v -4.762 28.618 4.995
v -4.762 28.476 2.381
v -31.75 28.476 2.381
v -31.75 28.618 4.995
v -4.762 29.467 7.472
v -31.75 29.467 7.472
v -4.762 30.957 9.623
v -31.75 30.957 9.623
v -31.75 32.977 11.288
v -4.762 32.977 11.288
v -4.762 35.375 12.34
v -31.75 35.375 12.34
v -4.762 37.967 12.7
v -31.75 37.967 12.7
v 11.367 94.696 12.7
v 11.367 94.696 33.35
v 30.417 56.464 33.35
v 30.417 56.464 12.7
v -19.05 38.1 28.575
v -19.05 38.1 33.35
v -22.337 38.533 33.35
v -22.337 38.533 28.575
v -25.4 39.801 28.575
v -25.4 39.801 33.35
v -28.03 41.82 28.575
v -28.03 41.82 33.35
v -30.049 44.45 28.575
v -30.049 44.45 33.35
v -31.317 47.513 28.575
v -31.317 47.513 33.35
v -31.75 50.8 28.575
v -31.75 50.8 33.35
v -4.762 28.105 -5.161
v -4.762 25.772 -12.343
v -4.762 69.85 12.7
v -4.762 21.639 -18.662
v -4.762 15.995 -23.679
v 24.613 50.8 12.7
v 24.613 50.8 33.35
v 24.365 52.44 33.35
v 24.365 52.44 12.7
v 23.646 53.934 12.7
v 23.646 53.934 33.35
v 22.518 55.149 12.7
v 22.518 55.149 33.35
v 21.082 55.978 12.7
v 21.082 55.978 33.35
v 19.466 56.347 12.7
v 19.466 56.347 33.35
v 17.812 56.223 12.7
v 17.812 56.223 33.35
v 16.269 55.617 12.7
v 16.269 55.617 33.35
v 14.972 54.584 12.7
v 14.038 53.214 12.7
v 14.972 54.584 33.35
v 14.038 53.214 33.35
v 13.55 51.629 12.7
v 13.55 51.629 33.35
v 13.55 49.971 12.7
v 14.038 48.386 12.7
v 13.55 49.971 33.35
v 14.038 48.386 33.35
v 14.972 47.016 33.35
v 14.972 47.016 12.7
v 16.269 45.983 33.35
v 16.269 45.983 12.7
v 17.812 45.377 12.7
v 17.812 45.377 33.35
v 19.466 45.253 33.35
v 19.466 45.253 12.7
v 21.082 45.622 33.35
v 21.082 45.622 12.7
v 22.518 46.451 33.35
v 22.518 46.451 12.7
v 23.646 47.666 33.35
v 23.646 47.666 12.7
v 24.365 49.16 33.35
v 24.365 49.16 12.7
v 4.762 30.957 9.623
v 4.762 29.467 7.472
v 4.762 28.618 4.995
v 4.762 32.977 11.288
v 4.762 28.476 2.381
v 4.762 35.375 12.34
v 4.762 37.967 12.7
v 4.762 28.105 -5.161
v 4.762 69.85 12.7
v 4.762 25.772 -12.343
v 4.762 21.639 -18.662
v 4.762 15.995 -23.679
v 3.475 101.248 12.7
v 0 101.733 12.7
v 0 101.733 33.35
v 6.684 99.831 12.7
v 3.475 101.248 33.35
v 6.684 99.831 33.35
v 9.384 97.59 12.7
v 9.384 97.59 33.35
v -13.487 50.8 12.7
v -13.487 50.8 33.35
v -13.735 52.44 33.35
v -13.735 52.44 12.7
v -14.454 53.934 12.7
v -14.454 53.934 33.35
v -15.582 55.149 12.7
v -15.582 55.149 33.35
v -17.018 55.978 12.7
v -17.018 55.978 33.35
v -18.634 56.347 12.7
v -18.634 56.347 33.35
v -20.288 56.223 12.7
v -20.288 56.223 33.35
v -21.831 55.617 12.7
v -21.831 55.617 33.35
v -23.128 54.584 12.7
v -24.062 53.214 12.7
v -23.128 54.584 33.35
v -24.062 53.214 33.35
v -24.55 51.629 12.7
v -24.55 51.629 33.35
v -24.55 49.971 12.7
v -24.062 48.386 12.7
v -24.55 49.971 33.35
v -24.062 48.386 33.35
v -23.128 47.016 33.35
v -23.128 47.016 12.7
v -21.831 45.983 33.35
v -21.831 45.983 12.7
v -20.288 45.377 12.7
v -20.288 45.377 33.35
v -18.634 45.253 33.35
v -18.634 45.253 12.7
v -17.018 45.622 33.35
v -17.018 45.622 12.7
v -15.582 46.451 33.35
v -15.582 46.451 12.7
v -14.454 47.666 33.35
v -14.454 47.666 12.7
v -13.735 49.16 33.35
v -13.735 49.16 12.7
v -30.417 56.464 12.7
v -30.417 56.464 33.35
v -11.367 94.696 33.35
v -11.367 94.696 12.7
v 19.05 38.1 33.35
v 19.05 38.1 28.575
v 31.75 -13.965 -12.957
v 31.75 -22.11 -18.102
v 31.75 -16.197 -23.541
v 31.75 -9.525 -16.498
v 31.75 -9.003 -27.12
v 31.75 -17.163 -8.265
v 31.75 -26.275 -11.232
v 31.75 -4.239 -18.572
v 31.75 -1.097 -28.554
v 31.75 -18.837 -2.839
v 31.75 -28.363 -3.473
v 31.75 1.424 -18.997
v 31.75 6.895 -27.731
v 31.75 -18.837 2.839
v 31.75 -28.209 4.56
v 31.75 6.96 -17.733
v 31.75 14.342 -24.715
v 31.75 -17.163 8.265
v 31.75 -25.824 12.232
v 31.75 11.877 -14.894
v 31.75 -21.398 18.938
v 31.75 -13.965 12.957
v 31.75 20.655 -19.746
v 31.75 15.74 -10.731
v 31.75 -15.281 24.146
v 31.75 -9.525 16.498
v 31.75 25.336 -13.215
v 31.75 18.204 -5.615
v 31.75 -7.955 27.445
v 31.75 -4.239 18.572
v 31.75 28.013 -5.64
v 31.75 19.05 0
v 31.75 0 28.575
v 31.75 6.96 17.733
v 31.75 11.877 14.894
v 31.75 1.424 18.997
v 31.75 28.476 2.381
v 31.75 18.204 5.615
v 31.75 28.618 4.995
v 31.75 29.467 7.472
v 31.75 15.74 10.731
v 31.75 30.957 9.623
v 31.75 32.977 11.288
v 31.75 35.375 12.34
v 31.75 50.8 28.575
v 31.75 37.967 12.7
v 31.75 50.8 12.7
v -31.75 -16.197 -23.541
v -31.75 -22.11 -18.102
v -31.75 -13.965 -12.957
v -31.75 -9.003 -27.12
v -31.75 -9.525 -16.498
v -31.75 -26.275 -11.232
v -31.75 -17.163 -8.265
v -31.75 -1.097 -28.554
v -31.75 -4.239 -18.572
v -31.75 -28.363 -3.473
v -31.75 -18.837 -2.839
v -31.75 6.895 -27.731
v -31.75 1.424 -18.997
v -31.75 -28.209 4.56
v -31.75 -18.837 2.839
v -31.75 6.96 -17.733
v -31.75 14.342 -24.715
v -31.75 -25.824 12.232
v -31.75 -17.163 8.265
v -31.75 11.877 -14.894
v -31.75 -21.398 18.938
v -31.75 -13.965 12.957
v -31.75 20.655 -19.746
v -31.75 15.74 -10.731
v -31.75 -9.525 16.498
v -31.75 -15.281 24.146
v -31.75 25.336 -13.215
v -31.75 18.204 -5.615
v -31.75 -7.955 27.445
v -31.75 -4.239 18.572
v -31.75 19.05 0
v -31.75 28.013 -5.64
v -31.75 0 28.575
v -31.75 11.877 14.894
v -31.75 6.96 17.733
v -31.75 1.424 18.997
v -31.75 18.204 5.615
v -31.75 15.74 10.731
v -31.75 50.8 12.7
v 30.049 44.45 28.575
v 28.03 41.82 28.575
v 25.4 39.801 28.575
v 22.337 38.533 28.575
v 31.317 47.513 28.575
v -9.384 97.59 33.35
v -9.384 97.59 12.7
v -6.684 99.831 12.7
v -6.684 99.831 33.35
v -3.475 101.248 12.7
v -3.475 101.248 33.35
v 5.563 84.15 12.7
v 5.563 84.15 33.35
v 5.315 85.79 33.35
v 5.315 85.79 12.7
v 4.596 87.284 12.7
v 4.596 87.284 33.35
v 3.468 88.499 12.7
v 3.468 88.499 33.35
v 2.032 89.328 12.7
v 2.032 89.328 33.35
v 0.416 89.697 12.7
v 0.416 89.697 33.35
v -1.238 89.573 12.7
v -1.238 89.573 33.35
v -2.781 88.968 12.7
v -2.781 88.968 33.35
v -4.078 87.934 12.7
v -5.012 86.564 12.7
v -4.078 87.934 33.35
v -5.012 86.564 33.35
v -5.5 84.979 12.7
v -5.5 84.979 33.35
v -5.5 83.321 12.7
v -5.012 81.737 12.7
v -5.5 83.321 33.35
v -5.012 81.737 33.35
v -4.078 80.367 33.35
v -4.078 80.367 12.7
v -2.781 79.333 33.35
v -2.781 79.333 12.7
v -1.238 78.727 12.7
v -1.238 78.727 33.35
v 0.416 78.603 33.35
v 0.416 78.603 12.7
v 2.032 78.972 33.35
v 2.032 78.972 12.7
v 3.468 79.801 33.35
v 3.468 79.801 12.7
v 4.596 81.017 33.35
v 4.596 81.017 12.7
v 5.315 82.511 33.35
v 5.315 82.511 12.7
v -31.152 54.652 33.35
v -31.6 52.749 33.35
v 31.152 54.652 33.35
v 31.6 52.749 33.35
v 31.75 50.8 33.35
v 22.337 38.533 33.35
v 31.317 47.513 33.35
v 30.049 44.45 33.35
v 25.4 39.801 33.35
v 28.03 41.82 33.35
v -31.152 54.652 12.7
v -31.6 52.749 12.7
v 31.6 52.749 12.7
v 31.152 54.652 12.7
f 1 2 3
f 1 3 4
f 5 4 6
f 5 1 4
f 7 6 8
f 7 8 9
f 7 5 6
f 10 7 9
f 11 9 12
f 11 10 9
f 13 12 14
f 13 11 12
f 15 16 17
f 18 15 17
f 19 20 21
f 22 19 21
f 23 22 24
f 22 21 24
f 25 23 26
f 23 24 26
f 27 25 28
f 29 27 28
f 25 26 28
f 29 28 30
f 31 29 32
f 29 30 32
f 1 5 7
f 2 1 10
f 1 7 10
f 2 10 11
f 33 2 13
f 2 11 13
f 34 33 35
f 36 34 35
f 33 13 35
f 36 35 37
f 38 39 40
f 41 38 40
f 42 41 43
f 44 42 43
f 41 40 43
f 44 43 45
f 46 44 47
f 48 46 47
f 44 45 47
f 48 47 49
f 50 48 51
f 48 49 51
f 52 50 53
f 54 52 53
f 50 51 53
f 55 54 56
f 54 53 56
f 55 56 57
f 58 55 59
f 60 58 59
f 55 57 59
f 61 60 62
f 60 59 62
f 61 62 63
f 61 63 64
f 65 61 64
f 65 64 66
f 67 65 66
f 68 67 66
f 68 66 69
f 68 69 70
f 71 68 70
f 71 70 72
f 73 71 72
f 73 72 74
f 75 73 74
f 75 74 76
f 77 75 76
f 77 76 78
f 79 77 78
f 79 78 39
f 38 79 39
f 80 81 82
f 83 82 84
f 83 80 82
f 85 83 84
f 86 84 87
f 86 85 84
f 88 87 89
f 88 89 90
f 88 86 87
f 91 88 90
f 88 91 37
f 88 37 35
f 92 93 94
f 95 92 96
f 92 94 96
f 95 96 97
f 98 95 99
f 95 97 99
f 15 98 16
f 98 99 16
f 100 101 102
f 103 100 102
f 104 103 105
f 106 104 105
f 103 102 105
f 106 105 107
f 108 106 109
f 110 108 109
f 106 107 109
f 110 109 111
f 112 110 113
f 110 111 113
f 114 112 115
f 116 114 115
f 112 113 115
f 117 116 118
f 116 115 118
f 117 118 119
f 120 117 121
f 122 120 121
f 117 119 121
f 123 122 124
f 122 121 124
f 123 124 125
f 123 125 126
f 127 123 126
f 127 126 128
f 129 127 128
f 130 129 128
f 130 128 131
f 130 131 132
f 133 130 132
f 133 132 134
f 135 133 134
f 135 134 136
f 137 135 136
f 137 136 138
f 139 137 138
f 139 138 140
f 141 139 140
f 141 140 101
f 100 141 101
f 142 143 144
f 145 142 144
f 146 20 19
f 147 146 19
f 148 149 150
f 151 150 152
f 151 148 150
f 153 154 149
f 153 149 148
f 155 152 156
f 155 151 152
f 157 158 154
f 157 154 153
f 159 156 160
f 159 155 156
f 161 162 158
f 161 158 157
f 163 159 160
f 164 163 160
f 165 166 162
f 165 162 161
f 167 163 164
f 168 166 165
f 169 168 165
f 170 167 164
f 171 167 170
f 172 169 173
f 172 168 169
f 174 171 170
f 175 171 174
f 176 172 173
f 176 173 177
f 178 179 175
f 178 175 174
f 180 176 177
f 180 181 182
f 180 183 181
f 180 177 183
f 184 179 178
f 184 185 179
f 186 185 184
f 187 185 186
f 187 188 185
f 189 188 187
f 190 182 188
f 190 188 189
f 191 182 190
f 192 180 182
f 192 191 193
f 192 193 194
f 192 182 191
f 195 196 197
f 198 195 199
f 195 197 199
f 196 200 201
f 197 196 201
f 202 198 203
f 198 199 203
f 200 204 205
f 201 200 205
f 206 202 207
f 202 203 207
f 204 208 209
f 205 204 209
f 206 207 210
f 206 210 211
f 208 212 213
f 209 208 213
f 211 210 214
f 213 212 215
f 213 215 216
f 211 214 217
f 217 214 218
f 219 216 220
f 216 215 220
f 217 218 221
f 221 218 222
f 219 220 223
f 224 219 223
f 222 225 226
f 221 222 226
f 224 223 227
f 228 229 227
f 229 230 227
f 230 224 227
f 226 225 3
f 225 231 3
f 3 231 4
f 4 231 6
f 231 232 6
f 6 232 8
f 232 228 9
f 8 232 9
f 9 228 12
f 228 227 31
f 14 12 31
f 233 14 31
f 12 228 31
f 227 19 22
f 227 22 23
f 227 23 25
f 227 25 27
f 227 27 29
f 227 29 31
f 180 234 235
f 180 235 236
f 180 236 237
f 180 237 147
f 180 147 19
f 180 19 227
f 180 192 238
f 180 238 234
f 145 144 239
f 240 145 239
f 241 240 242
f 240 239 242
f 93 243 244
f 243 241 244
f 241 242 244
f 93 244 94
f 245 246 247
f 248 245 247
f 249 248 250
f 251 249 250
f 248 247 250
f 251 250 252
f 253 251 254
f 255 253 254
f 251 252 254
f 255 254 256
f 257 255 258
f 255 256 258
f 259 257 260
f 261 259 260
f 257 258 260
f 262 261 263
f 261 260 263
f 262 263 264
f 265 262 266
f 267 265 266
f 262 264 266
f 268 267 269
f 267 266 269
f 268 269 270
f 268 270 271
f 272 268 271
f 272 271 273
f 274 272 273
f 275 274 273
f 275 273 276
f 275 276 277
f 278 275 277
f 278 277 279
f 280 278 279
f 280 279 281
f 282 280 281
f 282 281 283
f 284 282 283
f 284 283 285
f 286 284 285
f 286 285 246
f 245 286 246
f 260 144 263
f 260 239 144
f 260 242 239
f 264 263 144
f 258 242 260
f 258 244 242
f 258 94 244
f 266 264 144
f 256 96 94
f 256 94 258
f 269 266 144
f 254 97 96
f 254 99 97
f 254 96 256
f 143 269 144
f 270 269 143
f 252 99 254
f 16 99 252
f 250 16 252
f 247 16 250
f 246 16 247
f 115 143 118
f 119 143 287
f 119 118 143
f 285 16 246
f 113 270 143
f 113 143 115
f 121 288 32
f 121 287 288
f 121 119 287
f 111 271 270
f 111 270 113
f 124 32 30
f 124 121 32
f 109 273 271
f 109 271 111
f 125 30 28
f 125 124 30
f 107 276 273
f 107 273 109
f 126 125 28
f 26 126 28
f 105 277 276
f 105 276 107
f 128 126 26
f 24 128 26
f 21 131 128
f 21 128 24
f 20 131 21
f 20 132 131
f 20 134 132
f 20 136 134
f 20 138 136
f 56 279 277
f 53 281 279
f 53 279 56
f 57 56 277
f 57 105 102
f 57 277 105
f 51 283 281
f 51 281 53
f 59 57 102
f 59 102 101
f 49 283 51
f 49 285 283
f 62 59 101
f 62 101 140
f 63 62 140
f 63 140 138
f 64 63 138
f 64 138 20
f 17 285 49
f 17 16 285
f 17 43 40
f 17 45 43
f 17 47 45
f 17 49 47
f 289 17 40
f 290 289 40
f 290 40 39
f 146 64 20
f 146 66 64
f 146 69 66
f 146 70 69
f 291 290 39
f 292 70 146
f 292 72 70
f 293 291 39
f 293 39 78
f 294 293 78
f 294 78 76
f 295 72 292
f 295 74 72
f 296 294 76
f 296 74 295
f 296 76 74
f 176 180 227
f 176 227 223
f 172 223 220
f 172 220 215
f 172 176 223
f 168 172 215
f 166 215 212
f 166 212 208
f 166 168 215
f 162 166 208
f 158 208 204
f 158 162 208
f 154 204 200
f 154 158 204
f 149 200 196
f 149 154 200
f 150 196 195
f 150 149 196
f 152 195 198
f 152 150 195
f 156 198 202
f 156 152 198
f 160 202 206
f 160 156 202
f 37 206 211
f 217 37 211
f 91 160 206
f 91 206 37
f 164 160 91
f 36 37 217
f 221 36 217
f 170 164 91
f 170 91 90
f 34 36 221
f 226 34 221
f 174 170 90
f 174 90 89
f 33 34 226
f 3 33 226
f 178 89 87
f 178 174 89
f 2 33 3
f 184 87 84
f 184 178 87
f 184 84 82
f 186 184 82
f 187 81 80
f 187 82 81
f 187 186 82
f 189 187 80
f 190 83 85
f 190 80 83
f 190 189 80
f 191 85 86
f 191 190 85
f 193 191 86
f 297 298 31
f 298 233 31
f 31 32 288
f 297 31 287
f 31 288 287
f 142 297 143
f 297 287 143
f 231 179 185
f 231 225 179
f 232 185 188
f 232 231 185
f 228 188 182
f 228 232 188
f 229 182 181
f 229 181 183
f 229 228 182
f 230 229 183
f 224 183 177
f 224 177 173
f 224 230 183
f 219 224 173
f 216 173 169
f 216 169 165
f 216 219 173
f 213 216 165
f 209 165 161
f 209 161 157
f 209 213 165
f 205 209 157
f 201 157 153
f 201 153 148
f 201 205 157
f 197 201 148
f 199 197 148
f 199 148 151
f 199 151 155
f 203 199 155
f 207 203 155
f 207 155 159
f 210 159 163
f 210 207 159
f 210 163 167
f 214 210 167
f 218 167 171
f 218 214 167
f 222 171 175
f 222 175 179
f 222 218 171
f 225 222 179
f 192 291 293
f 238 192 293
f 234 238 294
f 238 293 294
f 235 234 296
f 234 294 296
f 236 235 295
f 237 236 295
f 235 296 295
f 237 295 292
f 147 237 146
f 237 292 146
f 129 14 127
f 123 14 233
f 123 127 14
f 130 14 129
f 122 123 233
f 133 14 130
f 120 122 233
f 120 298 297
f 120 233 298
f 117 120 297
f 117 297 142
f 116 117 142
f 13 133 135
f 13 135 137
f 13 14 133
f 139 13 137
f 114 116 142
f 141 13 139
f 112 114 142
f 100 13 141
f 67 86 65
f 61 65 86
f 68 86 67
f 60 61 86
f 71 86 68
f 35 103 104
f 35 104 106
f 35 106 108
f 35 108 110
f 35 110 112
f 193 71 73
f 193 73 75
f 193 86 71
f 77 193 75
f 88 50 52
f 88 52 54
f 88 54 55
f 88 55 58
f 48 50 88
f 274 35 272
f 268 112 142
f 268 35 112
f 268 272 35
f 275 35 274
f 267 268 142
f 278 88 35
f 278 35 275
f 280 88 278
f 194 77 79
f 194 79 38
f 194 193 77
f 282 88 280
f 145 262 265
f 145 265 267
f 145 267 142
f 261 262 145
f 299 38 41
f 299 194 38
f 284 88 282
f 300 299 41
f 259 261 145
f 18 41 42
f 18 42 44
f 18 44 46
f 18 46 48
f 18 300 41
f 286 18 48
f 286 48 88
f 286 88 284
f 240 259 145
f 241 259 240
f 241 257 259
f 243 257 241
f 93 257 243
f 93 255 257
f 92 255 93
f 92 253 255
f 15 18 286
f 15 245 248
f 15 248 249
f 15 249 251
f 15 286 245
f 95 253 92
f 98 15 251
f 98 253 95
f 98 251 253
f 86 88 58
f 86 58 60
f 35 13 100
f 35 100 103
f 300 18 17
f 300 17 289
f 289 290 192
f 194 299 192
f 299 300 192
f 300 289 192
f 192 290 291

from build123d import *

# Parameters (mm, degrees)
F0_R     = 19.05
F1_DEPTH = 31.75
F3_DEPTH = 43.06758
F4_DEPTH = 25.4
F5_DEPTH = 4.7752
F6_DEPTH = 4.7752
F2_R     = 5.5626
F7_DEPTH = 61.9262
F8_DEPTH = 4.7625


with BuildPart() as f1:
    # F0 (on Right) → F1 (new body, symmetric)
    with BuildSketch(Plane.YZ):
        with BuildLine():
            Line((38.1, 28.575), (0, 28.575))
            ThreePointArc((0, 28.575), (-27.3235693319, -8.3638020041), (15.9950252975, -23.6788891364))
            ThreePointArc((15.9950252975, -23.6788891364), (25.7719232537, -12.3425522809), (28.4756083945, 2.38125))
            ThreePointArc((28.4756083945, 2.38125), (30.9572676717, 9.6234554837), (37.9674778593, 12.7))
            Line((37.9674778593, 12.7), (69.85, 12.7))
            Line((69.85, 12.7), (101.7325221407, 12.7))
            Line((101.7325221407, 12.7), (101.7325221407, 33.3502))
            Line((101.7325221407, 33.3502), (38.1, 33.3502))
            Line((38.1, 33.3502), (38.1, 28.575))
        make_face()
        Circle(F0_R, mode=Mode.SUBTRACT)
    extrude(amount=F1_DEPTH, both=True)

    # F2 (on face) → F3 (cut)
    with BuildSketch(Plane.XY.offset(33.3502)):
        with BuildLine():
            ThreePointArc((30.4170945511, 56.4638468789), (31.4122833813, 53.7092867856), (31.75, 50.8))
            Line((31.75, 50.8), (31.75, 101.7325221407))
            Line((31.75, 101.7325221407), (-1.274e-07, 101.7325221407))
            ThreePointArc((-1.274e-07, 101.7325221407), (6.6842779412, 99.8311529985), (11.3670945511, 94.6963690195))
            Line((11.3670945511, 94.6963690195), (30.4170945511, 56.4638468789))
        make_face()
    extrude(amount=-F3_DEPTH, mode=Mode.SUBTRACT)

    # F2 (on face) → F4 (cut)
    with BuildSketch(Plane.XY.offset(33.3502)):
        with BuildLine():
            Line((-31.75, 101.7325221407), (-31.75, 50.8))
            ThreePointArc((-31.75, 50.8), (-31.4122833813, 53.7092867856), (-30.4170945511, 56.4638468789))
            Line((-30.4170945511, 56.4638468789), (-11.3670945511, 94.6963690195))
            ThreePointArc((-11.3670945511, 94.6963690195), (-6.6842780495, 99.8311529315), (-1.274e-07, 101.7325221407))
            Line((-1.274e-07, 101.7325221407), (-31.75, 101.7325221407))
        make_face()
    extrude(amount=-F4_DEPTH, mode=Mode.SUBTRACT)

    # F2 (on face) → F5 (cut)
    with BuildSketch(Plane.XY.offset(33.3502)):
        with BuildLine():
            Line((-31.75, 38.1), (-19.05, 38.1))
            ThreePointArc((-19.05, 38.1), (-28.0302561211, 41.8197438789), (-31.75, 50.8))
            Line((-31.75, 50.8), (-31.75, 38.1))
        make_face()
    extrude(amount=-F5_DEPTH, mode=Mode.SUBTRACT)

    # F2 (on face) → F6 (cut)
    with BuildSketch(Plane.XY.offset(33.3502)):
        with BuildLine():
            ThreePointArc((31.75, 50.8), (28.0302561211, 41.8197438789), (19.05, 38.1))
            Line((19.05, 38.1), (31.75, 38.1))
            Line((31.75, 38.1), (31.75, 50.8))
        make_face()
    extrude(amount=-F6_DEPTH, mode=Mode.SUBTRACT)

    # F2 (on face) → F7 (cut, through all)
    with BuildSketch(Plane.XY.offset(33.3502)):
        with Locations((-19.05, 50.8)):
            Circle(F2_R)
        with Locations((0, 84.1502)):
            Circle(F2_R)
        with Locations((19.05, 50.8)):
            Circle(F2_R)
    extrude(amount=-F7_DEPTH, mode=Mode.SUBTRACT)

    # F0 (on Right) → F8 (join, symmetric)
    with BuildSketch(Plane.YZ):
        with BuildLine():
            ThreePointArc((28.4756083945, 2.38125), (25.7719232537, -12.3425522809), (15.9950252975, -23.6788891364))
            Line((15.9950252975, -23.6788891364), (69.85, 12.7))
            Line((69.85, 12.7), (37.9674778593, 12.7))
            ThreePointArc((37.9674778593, 12.7), (30.9572676717, 9.6234554837), (28.4756083945, 2.38125))
        make_face()
    extrude(amount=F8_DEPTH, both=True)


solid = f1.part
